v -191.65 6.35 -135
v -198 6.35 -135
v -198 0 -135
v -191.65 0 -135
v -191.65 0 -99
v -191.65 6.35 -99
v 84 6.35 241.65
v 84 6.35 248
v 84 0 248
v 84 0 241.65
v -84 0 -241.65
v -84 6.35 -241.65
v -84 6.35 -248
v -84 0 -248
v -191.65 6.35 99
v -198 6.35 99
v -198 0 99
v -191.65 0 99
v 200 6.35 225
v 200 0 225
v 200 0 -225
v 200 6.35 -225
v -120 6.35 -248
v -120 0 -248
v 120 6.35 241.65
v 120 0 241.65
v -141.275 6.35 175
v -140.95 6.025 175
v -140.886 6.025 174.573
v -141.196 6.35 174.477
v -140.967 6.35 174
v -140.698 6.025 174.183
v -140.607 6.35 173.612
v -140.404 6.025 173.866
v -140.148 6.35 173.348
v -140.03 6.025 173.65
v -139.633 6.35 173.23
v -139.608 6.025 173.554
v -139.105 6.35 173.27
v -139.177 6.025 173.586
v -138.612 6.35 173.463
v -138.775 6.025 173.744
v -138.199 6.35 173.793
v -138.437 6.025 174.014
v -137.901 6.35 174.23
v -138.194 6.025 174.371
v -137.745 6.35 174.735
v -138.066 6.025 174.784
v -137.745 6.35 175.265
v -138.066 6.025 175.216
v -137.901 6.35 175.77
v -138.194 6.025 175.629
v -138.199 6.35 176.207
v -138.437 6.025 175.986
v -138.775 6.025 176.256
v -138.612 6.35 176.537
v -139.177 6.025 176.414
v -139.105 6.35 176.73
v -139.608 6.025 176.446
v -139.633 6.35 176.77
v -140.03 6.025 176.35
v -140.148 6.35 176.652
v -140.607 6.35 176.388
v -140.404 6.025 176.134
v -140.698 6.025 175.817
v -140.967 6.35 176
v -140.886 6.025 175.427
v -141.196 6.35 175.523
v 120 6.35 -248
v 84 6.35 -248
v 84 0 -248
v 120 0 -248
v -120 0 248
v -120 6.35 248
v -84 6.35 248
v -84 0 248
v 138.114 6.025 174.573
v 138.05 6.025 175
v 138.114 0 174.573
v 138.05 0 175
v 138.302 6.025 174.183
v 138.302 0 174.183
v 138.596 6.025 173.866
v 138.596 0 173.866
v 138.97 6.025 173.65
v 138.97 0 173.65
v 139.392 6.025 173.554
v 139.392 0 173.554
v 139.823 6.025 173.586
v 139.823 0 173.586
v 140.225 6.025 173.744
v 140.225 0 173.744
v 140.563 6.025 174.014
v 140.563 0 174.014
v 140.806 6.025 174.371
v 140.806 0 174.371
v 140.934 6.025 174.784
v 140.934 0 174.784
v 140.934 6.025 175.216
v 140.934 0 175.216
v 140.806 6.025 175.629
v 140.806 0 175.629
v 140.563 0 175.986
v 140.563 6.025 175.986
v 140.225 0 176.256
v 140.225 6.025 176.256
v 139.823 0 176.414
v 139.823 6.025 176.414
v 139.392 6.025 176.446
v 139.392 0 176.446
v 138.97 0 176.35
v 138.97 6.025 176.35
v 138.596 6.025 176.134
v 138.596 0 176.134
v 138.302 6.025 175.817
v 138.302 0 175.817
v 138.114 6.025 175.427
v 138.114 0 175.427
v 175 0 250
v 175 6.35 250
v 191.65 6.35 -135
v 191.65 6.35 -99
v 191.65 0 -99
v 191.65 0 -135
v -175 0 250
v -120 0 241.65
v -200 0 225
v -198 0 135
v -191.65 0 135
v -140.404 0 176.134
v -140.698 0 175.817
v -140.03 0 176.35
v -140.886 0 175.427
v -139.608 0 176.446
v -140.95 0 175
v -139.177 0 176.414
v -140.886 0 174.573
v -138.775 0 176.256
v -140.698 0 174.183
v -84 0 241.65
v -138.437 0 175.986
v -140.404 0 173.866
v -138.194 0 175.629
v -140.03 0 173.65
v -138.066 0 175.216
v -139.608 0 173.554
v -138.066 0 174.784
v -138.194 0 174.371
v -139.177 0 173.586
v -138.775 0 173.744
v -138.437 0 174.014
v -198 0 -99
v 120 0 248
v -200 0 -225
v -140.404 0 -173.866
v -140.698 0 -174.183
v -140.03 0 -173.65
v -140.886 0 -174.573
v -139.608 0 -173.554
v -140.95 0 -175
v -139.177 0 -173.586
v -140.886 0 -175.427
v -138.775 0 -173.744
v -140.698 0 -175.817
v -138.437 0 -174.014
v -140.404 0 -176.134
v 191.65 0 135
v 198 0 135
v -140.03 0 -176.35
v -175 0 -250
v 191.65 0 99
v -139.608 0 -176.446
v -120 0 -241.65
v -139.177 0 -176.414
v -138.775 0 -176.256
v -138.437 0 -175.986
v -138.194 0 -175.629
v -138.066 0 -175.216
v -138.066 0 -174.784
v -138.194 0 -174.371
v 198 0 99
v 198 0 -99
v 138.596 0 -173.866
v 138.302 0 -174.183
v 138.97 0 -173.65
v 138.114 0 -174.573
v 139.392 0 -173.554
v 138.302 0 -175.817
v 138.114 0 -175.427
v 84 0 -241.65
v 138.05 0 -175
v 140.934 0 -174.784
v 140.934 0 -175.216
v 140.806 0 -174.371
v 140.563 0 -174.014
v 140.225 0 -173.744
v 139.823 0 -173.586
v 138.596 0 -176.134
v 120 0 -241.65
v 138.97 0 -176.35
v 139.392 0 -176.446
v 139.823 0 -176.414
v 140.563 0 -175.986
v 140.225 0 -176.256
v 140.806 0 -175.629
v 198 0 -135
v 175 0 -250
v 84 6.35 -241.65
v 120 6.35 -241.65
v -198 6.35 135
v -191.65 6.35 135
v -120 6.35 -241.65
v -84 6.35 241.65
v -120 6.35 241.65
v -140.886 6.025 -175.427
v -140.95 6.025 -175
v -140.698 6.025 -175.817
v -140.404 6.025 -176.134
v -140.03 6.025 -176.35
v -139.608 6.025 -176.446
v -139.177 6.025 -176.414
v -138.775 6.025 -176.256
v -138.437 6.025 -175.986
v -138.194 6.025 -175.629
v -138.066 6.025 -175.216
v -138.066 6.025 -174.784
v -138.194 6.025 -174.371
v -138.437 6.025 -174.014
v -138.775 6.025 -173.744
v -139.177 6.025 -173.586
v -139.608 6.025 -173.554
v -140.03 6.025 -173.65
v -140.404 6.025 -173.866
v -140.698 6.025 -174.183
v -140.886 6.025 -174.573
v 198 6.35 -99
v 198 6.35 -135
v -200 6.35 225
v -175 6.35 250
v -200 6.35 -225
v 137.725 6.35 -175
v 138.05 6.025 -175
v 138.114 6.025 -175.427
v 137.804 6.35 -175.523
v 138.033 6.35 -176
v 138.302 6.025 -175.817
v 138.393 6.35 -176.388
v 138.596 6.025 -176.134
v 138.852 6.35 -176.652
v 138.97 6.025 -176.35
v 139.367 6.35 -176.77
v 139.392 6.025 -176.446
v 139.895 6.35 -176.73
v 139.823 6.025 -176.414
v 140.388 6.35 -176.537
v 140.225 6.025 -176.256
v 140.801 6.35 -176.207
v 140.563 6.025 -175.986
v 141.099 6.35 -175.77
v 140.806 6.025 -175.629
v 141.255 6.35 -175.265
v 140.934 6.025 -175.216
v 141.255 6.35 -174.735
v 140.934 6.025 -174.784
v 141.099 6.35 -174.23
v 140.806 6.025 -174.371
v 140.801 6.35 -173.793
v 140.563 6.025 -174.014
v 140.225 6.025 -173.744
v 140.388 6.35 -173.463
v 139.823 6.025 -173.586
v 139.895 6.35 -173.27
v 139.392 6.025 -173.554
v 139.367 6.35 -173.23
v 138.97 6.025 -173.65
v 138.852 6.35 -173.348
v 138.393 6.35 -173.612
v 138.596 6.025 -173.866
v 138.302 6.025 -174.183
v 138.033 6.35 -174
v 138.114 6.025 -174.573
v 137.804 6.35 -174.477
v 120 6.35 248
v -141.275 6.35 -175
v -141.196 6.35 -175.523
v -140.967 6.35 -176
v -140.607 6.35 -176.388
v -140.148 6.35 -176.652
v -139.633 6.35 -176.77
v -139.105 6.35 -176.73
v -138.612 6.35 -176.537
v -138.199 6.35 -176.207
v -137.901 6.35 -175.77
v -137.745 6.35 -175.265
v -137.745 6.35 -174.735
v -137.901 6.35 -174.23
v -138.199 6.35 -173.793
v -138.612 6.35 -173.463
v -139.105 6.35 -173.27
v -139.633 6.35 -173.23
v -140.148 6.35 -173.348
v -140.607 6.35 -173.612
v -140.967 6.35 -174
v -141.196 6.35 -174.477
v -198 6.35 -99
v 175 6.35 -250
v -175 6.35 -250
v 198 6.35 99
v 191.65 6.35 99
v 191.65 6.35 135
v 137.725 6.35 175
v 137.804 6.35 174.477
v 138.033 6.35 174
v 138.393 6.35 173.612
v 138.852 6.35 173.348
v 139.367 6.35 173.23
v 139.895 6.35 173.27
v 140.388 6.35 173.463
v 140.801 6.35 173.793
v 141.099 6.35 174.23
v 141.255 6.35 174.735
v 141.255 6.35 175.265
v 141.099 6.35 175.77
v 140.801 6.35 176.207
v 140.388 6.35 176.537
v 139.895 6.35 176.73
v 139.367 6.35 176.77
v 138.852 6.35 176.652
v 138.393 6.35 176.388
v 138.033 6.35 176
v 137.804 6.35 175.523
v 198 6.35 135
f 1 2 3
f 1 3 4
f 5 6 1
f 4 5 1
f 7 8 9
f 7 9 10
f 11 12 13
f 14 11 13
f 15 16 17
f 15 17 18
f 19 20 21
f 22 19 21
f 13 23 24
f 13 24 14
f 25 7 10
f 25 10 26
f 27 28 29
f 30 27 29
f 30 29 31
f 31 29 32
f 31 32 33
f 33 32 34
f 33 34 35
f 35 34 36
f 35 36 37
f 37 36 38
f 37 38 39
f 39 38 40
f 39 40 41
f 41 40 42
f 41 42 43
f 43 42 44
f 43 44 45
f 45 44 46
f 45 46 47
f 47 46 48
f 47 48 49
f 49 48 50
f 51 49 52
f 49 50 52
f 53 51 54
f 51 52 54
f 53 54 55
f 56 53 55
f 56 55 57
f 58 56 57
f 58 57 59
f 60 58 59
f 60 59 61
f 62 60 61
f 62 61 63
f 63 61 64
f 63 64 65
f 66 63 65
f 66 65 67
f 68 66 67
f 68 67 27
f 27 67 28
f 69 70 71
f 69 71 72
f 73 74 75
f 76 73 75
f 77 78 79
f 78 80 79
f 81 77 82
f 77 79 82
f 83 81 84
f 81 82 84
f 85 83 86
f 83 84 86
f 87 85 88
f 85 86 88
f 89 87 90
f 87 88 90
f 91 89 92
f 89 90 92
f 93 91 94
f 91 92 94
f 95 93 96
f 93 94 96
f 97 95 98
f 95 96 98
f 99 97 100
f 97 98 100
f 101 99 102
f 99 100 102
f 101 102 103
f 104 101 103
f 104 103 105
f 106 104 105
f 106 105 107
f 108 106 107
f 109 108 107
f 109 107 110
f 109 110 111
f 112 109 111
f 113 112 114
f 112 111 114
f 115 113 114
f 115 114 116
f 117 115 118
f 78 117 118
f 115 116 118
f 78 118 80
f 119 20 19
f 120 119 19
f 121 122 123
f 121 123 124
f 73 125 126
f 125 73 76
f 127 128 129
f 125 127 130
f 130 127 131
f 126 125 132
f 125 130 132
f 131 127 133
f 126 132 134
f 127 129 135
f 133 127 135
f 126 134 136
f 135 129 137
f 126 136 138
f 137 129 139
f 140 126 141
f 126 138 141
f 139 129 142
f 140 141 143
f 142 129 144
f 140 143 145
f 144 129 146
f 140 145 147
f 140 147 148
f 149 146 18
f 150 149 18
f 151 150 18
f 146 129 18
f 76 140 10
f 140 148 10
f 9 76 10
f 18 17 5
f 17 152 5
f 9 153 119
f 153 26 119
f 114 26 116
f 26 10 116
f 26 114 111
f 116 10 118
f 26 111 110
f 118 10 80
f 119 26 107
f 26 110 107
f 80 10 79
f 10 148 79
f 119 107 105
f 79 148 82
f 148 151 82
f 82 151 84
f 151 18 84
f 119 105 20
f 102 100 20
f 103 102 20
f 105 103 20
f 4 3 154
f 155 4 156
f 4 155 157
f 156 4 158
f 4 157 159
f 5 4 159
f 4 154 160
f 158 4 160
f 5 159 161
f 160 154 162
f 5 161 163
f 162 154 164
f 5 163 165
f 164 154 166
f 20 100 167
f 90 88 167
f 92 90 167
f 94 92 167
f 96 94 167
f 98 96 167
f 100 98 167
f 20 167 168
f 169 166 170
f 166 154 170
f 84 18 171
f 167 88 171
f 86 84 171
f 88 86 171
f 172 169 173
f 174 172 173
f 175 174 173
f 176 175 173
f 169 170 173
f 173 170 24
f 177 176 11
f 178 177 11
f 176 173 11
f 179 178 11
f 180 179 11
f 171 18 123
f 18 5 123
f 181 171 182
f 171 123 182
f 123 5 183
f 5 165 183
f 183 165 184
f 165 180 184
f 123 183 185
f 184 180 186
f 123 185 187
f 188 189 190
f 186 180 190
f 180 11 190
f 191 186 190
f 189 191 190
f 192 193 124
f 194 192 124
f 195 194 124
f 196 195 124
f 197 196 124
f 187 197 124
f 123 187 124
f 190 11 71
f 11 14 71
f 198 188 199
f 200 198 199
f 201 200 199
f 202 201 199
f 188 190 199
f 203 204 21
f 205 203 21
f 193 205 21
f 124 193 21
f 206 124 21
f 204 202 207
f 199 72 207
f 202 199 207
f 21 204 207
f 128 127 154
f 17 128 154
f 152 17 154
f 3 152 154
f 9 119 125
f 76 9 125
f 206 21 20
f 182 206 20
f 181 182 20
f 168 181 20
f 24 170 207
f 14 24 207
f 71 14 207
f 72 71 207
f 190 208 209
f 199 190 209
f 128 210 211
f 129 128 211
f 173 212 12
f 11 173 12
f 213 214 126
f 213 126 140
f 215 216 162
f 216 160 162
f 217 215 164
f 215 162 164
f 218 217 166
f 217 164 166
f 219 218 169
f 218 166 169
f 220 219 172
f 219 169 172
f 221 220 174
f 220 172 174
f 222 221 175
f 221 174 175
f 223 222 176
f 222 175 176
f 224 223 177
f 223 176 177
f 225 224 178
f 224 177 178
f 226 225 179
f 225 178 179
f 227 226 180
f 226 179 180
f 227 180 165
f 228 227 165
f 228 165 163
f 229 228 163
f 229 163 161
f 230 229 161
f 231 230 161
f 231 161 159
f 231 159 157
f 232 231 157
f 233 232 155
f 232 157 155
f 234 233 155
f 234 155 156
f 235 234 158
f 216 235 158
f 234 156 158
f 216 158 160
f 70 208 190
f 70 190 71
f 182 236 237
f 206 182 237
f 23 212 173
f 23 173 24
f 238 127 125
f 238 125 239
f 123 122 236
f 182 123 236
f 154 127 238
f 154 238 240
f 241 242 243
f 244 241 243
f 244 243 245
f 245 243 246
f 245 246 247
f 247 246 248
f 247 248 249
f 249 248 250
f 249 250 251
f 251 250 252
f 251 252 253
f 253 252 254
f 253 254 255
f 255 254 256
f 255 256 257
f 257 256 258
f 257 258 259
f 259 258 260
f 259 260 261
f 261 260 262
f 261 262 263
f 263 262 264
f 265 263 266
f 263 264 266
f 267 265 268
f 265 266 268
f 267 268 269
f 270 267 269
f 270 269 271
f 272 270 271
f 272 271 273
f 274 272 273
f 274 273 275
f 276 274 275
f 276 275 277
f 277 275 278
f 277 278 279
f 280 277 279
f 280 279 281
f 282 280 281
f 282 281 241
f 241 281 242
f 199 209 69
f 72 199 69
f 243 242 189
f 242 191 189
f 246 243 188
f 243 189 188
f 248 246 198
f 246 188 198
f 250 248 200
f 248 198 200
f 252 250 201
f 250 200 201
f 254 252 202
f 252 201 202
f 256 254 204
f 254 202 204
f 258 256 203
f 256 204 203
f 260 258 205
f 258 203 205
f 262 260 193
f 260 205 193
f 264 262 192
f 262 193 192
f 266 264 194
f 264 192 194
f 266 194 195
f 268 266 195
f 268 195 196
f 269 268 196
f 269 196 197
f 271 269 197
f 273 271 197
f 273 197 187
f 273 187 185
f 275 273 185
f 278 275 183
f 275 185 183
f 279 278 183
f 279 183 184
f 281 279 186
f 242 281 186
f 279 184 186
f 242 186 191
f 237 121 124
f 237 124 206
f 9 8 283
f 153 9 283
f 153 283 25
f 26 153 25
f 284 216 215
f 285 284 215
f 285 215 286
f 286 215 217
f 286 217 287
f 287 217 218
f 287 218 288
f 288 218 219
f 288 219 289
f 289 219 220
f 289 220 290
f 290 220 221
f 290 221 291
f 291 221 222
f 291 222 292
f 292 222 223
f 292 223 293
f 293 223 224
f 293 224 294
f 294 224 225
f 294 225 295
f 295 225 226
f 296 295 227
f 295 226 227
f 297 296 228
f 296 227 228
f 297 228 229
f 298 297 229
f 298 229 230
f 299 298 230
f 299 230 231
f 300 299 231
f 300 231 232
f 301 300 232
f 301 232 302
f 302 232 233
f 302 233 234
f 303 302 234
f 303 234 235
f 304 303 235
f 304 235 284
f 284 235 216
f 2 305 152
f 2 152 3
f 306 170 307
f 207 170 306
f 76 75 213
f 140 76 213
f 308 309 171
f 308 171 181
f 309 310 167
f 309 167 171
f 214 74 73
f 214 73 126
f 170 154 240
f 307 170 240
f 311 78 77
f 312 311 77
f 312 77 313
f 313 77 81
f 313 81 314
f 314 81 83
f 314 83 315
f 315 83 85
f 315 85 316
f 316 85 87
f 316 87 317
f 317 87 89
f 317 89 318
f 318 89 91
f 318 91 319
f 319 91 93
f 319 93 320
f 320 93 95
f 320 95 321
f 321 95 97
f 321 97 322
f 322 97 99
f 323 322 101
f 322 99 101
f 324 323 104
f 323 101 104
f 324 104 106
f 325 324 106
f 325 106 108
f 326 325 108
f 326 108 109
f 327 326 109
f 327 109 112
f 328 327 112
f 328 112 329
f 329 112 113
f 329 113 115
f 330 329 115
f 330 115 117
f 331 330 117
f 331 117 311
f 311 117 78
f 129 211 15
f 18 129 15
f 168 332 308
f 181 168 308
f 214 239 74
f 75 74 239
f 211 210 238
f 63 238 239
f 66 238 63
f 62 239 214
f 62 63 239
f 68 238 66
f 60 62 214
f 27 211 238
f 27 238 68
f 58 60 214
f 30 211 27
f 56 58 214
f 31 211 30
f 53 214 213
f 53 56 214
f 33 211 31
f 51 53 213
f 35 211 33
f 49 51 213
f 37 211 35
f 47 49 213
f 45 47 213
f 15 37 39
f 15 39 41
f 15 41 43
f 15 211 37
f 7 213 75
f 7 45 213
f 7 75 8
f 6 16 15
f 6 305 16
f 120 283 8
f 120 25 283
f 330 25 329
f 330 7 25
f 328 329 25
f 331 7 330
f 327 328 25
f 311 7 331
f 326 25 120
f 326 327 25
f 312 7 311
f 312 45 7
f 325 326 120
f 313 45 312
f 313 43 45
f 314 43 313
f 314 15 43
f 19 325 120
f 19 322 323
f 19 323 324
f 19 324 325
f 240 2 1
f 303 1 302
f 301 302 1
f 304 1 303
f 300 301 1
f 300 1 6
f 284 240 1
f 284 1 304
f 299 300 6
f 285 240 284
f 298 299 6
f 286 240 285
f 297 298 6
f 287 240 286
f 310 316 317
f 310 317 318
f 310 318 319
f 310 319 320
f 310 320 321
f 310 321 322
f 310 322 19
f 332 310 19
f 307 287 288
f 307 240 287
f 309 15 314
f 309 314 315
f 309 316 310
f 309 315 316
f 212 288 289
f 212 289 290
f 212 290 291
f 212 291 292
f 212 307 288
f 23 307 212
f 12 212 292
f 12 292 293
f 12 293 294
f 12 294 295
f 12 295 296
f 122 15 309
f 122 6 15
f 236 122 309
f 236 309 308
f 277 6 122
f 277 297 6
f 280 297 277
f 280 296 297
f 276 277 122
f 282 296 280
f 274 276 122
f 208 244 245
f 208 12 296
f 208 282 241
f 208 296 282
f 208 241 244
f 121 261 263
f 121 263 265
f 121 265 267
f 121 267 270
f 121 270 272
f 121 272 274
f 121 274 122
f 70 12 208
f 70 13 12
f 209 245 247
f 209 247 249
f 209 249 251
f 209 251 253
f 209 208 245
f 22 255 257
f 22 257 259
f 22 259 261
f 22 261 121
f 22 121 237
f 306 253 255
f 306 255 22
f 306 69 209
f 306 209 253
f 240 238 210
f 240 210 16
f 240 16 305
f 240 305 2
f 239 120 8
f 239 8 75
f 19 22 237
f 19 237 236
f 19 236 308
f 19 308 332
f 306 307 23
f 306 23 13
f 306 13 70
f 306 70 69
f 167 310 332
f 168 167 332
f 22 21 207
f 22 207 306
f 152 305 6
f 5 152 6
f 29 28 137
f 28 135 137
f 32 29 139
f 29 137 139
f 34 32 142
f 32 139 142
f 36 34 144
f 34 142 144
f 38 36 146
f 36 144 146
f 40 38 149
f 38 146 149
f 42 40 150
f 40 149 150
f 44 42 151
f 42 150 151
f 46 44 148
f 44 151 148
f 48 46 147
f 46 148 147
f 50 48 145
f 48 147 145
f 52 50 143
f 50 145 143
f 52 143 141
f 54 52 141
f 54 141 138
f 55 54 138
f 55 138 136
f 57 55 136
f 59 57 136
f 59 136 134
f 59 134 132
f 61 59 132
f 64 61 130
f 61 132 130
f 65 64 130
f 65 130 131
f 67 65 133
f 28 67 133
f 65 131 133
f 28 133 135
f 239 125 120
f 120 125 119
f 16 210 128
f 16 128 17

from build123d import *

# Parameters (mm, degrees)
SKETCH2_W                         = 400
SKETCH2_H                         = 500
BOSS_EXTRUDE2_DEPTH               = 6.35
M3_5X0_6_TAPPED_HOLE2_D           = 2.9
M3_5X0_6_TAPPED_HOLE2_CSINK_D     = 3.55
M3_5X0_6_TAPPED_HOLE2_CSINK_ANGLE = 90
CHAMFER1_SIZE                     = 25
SKETCH9_W                         = 6.35
SKETCH9_H                         = 36
SKETCH9_W_2                       = 36
SKETCH9_H_2                       = 6.35
CUT_EXTRUDE1_DEPTH                = 321.219178845


with BuildPart() as part:
    # Sketch2 → Boss-Extrude2 (new body)
    with BuildSketch(Plane(origin=(0, 0, 0), x_dir=(1, 0, 0), z_dir=(0, 1, 0))):
        Rectangle(SKETCH2_W, SKETCH2_H)
    extrude(amount=BOSS_EXTRUDE2_DEPTH)

    # M3.5x0.6 Tapped Hole2 (through all)
    with Locations(Plane(origin=(0, 6.35, 0), x_dir=(1, 0, 0), z_dir=(0, 1, 0))):
        with Locations((-139.5, 175), (139.5, 175), (-139.5, -175), (139.5, -175)):
            CounterSinkHole(M3_5X0_6_TAPPED_HOLE2_D / 2, M3_5X0_6_TAPPED_HOLE2_CSINK_D / 2, counter_sink_angle=M3_5X0_6_TAPPED_HOLE2_CSINK_ANGLE)

    # Chamfer1
    chamfer1_edges = [part.edges().sort_by_distance(p)[0] for p in [
        (200, 3.175, 250),
        (-200, 3.175, 250),
        (-200, 3.175, -250),
        (200, 3.175, -250),
    ]]
    chamfer(chamfer1_edges, length=CHAMFER1_SIZE)

    # Sketch9 → Cut-Extrude1 (cut, through all)
    with BuildSketch(Plane(origin=(0, 6.35, 0), x_dir=(1, 0, 0), z_dir=(0, 1, 0))):
        with Locations((194.825, 117)):
            Rectangle(SKETCH9_W, SKETCH9_H)
        with Locations((102, -244.825)):
            Rectangle(SKETCH9_W_2, SKETCH9_H_2)
        with Locations((-102, -244.825)):
            Rectangle(SKETCH9_W_2, SKETCH9_H_2)
        with Locations((-102, 244.825)):
            Rectangle(SKETCH9_W_2, SKETCH9_H_2)
        with Locations((102, 244.825)):
            Rectangle(SKETCH9_W_2, SKETCH9_H_2)
        with Locations((194.825, -117)):
            Rectangle(SKETCH9_W, SKETCH9_H)
        with Locations((-194.825, -117)):
            Rectangle(SKETCH9_W, SKETCH9_H)
        with Locations((-194.825, 117)):
            Rectangle(SKETCH9_W, SKETCH9_H)
    extrude(amount=-CUT_EXTRUDE1_DEPTH, mode=Mode.SUBTRACT)


solid = part.part
